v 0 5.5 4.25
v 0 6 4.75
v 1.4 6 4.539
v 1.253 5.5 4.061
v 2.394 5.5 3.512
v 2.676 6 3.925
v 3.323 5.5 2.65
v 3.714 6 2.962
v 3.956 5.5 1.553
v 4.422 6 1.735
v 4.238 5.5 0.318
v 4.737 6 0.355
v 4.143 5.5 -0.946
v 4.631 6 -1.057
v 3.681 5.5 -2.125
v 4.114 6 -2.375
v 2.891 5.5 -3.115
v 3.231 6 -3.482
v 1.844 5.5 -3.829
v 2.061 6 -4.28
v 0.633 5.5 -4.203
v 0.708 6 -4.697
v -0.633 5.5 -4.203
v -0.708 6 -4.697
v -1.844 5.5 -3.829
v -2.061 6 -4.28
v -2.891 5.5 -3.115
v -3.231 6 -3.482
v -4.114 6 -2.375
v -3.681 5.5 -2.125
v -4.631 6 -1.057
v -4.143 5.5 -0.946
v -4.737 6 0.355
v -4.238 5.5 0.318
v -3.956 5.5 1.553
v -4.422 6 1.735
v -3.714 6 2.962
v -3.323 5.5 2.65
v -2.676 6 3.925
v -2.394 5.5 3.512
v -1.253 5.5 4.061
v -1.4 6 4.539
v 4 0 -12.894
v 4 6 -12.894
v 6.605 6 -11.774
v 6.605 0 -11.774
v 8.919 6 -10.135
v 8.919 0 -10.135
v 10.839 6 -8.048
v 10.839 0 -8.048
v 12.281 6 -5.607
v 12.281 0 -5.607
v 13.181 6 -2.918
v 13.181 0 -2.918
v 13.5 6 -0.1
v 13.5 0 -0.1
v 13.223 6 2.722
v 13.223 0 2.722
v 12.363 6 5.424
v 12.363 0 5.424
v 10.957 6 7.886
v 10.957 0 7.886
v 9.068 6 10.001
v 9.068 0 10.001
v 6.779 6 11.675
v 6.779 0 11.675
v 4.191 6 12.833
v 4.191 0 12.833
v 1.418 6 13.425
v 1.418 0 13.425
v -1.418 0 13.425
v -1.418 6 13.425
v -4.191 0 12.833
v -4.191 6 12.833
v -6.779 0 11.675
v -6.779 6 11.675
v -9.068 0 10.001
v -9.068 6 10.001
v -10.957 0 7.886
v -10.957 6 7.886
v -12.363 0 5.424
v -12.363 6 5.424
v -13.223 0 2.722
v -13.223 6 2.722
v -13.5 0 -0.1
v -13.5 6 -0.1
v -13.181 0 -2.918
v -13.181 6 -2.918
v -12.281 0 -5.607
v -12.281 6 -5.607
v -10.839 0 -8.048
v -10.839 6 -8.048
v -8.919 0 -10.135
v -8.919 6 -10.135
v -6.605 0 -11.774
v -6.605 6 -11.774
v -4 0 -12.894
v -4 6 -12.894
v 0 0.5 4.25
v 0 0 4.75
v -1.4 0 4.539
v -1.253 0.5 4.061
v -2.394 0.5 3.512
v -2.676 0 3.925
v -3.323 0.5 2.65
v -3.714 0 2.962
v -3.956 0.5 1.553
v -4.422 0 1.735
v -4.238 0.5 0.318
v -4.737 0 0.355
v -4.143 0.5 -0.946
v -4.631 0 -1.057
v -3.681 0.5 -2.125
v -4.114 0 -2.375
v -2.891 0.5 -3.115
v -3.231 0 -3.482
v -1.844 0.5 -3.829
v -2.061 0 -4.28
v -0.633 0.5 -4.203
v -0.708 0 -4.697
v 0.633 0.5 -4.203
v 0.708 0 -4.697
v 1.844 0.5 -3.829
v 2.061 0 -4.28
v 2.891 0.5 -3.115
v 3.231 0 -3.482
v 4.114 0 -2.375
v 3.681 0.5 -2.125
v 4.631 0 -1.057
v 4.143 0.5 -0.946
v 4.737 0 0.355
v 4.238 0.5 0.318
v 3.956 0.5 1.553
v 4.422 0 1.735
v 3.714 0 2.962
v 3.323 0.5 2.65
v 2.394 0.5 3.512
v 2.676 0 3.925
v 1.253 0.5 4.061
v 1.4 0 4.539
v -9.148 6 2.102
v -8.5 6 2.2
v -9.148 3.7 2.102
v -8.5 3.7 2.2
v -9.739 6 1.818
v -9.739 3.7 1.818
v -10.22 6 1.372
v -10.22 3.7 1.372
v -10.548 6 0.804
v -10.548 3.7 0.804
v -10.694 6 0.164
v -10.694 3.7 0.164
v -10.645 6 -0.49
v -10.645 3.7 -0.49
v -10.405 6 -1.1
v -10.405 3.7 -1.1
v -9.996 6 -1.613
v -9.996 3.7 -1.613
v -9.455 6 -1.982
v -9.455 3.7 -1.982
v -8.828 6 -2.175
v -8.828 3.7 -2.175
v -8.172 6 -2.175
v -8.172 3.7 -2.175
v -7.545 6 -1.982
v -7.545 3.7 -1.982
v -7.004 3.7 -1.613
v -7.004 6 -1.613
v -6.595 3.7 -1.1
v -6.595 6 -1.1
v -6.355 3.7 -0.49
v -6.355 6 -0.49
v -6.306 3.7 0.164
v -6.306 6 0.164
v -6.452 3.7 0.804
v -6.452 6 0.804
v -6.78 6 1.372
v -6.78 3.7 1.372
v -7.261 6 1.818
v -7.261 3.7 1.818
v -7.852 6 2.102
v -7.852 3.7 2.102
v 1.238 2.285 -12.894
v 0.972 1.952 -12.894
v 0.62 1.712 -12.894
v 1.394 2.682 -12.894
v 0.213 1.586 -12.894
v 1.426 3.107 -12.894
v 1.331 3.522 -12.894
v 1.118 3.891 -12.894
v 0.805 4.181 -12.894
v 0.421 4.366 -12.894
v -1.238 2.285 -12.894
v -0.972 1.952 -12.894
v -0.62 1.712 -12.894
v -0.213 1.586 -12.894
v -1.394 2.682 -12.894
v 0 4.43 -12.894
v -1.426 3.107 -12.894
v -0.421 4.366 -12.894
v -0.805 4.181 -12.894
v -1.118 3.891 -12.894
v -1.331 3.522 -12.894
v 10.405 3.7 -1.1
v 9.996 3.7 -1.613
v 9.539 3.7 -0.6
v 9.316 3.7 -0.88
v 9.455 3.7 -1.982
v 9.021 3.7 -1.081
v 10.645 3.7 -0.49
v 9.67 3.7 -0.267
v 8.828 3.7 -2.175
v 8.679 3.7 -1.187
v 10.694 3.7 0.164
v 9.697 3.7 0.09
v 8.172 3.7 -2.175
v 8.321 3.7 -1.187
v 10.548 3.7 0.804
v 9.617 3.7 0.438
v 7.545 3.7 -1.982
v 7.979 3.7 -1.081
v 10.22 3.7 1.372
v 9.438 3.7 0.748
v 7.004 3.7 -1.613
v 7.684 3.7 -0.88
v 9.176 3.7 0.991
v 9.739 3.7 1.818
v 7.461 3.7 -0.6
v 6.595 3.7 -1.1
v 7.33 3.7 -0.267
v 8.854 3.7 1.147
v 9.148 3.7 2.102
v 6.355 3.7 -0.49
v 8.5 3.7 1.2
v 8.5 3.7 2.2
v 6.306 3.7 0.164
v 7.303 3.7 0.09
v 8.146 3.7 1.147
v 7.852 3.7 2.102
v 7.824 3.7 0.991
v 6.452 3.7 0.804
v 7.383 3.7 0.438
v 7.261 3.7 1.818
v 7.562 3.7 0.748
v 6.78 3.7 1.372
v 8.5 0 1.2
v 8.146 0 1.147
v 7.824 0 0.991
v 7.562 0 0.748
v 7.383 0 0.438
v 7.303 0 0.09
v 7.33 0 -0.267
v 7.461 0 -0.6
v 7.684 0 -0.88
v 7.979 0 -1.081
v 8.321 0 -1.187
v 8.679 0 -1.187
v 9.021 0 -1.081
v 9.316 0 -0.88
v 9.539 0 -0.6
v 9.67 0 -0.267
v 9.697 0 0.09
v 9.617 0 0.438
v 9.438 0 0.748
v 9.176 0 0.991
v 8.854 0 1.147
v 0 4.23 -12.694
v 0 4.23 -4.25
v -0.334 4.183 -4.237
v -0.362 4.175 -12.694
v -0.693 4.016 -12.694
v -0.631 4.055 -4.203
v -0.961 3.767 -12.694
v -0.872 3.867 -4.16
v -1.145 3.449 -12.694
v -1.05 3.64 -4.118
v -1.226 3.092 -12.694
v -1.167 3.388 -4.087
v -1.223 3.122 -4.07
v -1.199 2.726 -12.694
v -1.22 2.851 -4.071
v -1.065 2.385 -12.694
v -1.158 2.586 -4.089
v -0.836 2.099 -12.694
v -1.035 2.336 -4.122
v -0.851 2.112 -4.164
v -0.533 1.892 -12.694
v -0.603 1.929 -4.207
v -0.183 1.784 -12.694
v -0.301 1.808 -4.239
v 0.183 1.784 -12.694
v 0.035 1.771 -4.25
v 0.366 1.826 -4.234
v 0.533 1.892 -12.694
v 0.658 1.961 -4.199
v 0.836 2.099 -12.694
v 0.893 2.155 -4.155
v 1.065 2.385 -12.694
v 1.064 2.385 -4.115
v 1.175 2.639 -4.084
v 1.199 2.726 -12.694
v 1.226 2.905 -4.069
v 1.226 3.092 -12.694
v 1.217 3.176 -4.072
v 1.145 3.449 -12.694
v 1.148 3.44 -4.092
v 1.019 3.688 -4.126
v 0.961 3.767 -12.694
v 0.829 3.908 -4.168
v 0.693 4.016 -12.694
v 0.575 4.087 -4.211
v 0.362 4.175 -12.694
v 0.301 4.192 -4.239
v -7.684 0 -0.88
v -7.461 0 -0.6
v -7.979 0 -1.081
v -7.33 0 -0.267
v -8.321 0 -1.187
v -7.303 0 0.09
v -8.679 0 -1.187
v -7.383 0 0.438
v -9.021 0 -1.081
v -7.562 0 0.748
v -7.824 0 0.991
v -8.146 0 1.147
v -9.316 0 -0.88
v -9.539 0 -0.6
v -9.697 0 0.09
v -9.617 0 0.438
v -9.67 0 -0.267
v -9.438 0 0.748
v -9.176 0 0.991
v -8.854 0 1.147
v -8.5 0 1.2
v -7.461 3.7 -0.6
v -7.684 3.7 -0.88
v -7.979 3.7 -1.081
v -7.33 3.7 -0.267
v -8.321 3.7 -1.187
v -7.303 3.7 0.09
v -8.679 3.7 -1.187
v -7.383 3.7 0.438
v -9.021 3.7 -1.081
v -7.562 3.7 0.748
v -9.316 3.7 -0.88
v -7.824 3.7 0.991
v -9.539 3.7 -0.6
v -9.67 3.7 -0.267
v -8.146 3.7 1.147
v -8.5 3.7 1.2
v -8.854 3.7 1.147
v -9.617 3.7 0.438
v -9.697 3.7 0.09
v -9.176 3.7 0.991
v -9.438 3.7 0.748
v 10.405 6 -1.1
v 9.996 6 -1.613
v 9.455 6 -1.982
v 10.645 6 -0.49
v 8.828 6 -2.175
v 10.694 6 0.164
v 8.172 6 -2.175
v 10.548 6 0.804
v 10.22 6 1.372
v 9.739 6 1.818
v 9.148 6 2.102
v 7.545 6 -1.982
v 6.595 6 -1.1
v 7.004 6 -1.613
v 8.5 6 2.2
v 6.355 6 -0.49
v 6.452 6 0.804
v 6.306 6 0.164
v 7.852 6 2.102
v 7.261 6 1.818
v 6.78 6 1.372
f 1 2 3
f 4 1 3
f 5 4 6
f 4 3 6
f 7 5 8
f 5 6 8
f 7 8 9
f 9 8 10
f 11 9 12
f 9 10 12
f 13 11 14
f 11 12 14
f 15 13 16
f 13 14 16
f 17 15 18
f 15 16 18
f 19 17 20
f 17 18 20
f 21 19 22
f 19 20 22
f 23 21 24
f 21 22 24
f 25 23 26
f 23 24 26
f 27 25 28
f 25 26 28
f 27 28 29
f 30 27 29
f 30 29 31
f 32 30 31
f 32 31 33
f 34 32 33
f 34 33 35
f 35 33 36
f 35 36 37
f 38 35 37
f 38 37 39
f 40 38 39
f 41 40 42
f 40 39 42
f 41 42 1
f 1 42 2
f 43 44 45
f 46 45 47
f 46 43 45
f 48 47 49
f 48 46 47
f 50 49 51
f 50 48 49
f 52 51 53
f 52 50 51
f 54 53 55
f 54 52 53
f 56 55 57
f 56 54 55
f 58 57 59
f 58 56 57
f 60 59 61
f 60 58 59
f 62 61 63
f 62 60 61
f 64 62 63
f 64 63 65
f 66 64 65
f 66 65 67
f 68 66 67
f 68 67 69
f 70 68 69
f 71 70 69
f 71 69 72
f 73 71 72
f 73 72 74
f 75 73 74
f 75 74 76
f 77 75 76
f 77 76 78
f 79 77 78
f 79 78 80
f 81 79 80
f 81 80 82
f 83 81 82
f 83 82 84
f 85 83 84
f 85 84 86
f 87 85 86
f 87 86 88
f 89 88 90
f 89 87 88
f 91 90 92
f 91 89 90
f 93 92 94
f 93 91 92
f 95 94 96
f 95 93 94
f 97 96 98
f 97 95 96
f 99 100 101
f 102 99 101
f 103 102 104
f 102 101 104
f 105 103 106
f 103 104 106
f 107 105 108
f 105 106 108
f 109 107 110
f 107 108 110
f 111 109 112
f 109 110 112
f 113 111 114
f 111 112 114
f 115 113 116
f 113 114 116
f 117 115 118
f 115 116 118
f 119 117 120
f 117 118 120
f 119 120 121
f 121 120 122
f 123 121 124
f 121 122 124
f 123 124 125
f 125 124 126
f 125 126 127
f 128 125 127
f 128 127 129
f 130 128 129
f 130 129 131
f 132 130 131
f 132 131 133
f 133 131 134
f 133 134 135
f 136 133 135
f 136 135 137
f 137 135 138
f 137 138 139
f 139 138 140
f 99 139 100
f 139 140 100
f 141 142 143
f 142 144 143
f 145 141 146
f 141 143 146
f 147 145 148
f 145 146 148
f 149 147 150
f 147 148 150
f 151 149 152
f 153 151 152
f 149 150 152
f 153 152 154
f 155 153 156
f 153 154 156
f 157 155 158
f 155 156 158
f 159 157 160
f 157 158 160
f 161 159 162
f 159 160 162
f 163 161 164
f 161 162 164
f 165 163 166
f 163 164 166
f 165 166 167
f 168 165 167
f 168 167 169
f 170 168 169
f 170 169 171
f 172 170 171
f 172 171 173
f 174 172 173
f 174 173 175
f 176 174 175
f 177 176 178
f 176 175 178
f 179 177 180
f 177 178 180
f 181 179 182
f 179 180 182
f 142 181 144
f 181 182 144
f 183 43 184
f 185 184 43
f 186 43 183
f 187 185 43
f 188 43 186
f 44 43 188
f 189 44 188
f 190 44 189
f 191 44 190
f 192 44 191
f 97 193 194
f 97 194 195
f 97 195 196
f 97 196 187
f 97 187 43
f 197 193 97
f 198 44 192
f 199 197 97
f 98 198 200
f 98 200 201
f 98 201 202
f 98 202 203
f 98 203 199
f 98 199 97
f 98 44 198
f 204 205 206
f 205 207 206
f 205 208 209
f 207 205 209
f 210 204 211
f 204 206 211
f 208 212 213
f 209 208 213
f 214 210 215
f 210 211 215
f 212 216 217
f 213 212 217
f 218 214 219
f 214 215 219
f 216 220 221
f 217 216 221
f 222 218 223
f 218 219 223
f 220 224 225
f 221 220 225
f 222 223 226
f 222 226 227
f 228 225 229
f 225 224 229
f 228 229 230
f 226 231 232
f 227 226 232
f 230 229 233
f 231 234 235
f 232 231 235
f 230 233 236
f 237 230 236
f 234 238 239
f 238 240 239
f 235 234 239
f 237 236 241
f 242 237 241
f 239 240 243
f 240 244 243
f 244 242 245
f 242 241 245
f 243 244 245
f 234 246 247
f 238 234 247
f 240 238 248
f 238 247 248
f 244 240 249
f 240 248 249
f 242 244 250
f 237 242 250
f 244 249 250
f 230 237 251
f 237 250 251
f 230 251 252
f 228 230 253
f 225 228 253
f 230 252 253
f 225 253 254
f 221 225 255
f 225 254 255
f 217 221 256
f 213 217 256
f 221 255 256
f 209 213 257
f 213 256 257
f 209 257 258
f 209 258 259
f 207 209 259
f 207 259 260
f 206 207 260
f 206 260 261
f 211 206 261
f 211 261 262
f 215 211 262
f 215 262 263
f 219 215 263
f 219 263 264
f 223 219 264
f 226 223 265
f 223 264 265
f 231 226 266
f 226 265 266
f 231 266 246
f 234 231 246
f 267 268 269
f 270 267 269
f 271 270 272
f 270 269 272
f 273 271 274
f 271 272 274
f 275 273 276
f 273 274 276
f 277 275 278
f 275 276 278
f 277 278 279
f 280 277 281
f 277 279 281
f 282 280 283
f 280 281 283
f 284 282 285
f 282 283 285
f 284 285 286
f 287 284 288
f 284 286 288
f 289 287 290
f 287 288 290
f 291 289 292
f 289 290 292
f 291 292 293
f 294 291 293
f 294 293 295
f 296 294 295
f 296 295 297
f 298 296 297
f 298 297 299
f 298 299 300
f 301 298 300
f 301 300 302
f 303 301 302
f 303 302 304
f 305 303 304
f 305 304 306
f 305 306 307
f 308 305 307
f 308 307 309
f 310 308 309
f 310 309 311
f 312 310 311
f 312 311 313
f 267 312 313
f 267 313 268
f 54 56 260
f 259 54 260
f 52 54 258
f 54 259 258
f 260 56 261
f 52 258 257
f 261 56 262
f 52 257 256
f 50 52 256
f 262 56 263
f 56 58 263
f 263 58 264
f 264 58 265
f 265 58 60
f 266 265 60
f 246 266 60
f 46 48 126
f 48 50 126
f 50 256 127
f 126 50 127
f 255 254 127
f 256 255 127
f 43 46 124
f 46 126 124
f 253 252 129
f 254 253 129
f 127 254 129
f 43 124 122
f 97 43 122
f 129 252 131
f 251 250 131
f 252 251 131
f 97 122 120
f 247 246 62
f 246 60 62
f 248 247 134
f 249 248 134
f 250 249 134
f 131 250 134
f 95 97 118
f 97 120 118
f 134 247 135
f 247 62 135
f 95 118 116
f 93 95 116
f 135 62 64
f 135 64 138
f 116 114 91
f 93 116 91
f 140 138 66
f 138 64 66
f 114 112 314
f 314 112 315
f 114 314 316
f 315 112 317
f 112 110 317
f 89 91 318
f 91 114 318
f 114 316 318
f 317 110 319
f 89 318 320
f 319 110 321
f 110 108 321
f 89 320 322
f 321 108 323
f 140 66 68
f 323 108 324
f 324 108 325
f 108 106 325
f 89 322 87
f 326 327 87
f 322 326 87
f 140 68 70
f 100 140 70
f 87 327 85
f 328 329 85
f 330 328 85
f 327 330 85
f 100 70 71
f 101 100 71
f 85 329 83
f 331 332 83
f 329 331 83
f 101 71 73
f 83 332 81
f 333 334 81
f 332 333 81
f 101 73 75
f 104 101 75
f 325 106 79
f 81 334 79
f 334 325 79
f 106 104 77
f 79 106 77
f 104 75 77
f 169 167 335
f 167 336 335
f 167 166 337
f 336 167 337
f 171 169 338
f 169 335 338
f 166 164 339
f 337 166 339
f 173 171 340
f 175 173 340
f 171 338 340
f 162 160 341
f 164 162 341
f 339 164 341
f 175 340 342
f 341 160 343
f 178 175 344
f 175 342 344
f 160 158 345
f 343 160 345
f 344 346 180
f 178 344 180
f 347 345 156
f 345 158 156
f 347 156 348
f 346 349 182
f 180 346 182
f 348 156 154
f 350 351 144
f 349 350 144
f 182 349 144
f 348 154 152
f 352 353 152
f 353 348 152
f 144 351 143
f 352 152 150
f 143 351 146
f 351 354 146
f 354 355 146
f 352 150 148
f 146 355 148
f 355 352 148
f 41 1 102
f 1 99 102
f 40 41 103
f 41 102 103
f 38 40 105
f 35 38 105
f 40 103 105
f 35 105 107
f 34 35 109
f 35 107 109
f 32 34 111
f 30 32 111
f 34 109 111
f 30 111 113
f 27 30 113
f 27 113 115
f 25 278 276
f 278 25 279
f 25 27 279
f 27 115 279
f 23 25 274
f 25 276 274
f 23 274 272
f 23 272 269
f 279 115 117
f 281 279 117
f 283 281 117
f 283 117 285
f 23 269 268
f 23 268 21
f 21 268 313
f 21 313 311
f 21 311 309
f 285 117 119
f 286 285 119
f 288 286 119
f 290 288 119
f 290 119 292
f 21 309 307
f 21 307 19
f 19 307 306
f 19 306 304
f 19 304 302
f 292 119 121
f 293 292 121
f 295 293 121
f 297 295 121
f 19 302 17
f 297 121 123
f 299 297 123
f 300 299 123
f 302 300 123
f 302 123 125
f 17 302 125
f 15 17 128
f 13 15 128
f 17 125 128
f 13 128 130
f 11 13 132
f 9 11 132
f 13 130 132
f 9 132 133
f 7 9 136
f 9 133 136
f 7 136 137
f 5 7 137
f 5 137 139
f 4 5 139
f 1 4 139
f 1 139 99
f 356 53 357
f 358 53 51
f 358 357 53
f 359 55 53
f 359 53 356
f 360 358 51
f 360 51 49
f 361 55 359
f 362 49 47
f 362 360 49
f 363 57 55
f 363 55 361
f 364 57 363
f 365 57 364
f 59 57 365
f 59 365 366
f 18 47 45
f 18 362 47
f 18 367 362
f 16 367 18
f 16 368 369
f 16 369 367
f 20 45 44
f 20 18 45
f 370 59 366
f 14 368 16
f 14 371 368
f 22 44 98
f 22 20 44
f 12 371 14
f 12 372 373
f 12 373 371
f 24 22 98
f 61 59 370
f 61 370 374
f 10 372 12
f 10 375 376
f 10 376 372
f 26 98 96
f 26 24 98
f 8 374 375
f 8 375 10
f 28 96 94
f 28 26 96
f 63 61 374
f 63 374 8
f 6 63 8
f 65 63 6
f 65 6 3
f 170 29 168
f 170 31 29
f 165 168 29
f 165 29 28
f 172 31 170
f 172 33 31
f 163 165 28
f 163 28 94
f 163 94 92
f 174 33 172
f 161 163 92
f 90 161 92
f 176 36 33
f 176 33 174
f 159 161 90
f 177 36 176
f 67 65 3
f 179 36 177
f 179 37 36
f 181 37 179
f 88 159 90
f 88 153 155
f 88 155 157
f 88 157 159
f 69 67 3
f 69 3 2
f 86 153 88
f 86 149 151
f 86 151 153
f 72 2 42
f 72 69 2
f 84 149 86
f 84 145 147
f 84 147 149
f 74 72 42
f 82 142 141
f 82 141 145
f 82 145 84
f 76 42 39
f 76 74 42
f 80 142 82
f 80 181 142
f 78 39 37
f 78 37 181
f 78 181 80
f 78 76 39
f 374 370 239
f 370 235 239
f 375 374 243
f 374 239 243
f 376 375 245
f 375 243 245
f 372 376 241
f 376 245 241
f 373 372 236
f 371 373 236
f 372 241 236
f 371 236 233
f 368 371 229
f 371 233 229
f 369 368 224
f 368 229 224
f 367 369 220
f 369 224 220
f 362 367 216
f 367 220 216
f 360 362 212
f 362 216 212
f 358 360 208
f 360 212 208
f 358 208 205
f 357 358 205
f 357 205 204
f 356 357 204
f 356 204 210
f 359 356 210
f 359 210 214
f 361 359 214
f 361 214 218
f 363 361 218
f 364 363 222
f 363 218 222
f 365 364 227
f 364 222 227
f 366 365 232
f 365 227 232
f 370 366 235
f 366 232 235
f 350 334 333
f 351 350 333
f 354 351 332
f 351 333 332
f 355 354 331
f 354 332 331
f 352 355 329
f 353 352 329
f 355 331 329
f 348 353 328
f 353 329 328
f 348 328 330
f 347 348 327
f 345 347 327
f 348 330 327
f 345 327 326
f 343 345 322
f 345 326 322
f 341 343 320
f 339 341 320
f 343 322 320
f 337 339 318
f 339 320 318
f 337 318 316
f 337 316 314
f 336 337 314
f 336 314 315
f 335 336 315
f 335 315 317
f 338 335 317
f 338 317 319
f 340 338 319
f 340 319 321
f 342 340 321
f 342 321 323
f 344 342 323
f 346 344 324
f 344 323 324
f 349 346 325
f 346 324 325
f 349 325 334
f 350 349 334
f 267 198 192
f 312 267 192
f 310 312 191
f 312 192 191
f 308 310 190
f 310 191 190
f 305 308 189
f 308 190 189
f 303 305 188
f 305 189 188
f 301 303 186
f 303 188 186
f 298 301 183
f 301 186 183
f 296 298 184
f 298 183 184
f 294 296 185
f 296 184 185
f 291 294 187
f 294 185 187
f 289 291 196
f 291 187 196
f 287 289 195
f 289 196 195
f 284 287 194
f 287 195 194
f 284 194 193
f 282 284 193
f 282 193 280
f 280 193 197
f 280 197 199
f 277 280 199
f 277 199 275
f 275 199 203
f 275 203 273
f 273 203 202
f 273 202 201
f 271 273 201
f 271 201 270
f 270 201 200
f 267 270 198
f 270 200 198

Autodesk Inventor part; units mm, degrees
ref_plane "YZ Plane" through (0, 0, 0) normal (1, 0, 0) x (0, 1, 0)
ref_plane "XZ Plane" through (0, 0, 0) normal (0, 1, 0) x (-1, 0, 0)
ref_plane "XY Plane" through (0, 0, 0) normal (0, 0, 1) x (1, 0, 0)
sketch "Sketch1" plane through (0, 0, 0) normal (0, 1, 0) x (-1, 0, 0)
  circle A0 centre (0, 0) radius 13.5
  dimension "d0" = 27
extrude "Extrusion1" add sketch "Sketch1" along normal blind 6
sketch "Sketch3" plane through (0, 6, 0) normal (0, 1, 0) x (1, 0, 0)
  point P0 (0, 0)
  point P1 (0, 0)
hole "Hole1" at (0, 6, 0) direction (0, -1, 0) diameter 8.5 end through all
sketch "Sketch4" plane through (0, 6, 0) normal (0, 1, 0) x (1, 0, 0)
  point P0 (0, 0)
  point P1 (-8.5, 0)
  point P2 (8.5, 0)
  dimension "d13" = 17
  dimension "d14" = 8.5
hole "Hole2" at (-8.5, 6, 0) at (8.5, 6, 0) direction (0, -1, 0) diameter 2.4 end through all counterbore diameter 4.4 counterbore depth 2.3 clearance for "Socket Head Cap Screw ISO 4762" size "M2" standard "ISO"
chamfer "Chamfer2" distance 0.5 angle 45 2 edges at (0, 0, -4.25) (0, 6, -4.25)
sketch "Sketch5" plane through (0, 6, 0) normal (0, 1, 0) x (1, 0, 0)
  line L0 (0, 0) -> (4, 12.8938) construction
  circle A0 centre (0, 0) radius 13.5 construction
  line L1 (0, 0) -> (-4, 12.8938) construction
  line L2 (0, 18.9) -> (0, -18.9) construction
  line L3 (4, 12.8938) -> (-4, 12.8938)
  arc A1 (4, 12.8938) -> (-4, 12.8938) centre (0, 0) ccw
  point P0 (0, 13.5)
  dimension "d28" = 8
extrude "Extrusion3" cut sketch "Sketch5" against normal through all
sketch "Sketch6" plane through (4, 6, -12.8938) normal (0, 0, -1) x (-1, 0, 0)
  line L0 (8, -6) -> (0, -6) construction
  line L1 (8, 0) -> (8, -6) construction
  line L2 (0, 0) -> (8, 0) construction
  line L3 (0, -6) -> (0, 0) construction
  line L4 (0, 0) -> (8, -6) construction
  point P0 (4, -6)
  point P1 (4, -3)
hole "Hole3" at (0, 3, -12.8938) direction (0, 0, 1) diameter 2.459 depth 10 tip angle 118 thread size "M3x0.5" class "6H" standard "ISO Metric profile"
chamfer "Chamfer3" distance 0.2 angle 45 1 edges at (0, 1.7705, -12.8938)
equation "\"d14\" = 0.5 * d13"
properties part number "KN-00-02-12" material "CuZn40"
